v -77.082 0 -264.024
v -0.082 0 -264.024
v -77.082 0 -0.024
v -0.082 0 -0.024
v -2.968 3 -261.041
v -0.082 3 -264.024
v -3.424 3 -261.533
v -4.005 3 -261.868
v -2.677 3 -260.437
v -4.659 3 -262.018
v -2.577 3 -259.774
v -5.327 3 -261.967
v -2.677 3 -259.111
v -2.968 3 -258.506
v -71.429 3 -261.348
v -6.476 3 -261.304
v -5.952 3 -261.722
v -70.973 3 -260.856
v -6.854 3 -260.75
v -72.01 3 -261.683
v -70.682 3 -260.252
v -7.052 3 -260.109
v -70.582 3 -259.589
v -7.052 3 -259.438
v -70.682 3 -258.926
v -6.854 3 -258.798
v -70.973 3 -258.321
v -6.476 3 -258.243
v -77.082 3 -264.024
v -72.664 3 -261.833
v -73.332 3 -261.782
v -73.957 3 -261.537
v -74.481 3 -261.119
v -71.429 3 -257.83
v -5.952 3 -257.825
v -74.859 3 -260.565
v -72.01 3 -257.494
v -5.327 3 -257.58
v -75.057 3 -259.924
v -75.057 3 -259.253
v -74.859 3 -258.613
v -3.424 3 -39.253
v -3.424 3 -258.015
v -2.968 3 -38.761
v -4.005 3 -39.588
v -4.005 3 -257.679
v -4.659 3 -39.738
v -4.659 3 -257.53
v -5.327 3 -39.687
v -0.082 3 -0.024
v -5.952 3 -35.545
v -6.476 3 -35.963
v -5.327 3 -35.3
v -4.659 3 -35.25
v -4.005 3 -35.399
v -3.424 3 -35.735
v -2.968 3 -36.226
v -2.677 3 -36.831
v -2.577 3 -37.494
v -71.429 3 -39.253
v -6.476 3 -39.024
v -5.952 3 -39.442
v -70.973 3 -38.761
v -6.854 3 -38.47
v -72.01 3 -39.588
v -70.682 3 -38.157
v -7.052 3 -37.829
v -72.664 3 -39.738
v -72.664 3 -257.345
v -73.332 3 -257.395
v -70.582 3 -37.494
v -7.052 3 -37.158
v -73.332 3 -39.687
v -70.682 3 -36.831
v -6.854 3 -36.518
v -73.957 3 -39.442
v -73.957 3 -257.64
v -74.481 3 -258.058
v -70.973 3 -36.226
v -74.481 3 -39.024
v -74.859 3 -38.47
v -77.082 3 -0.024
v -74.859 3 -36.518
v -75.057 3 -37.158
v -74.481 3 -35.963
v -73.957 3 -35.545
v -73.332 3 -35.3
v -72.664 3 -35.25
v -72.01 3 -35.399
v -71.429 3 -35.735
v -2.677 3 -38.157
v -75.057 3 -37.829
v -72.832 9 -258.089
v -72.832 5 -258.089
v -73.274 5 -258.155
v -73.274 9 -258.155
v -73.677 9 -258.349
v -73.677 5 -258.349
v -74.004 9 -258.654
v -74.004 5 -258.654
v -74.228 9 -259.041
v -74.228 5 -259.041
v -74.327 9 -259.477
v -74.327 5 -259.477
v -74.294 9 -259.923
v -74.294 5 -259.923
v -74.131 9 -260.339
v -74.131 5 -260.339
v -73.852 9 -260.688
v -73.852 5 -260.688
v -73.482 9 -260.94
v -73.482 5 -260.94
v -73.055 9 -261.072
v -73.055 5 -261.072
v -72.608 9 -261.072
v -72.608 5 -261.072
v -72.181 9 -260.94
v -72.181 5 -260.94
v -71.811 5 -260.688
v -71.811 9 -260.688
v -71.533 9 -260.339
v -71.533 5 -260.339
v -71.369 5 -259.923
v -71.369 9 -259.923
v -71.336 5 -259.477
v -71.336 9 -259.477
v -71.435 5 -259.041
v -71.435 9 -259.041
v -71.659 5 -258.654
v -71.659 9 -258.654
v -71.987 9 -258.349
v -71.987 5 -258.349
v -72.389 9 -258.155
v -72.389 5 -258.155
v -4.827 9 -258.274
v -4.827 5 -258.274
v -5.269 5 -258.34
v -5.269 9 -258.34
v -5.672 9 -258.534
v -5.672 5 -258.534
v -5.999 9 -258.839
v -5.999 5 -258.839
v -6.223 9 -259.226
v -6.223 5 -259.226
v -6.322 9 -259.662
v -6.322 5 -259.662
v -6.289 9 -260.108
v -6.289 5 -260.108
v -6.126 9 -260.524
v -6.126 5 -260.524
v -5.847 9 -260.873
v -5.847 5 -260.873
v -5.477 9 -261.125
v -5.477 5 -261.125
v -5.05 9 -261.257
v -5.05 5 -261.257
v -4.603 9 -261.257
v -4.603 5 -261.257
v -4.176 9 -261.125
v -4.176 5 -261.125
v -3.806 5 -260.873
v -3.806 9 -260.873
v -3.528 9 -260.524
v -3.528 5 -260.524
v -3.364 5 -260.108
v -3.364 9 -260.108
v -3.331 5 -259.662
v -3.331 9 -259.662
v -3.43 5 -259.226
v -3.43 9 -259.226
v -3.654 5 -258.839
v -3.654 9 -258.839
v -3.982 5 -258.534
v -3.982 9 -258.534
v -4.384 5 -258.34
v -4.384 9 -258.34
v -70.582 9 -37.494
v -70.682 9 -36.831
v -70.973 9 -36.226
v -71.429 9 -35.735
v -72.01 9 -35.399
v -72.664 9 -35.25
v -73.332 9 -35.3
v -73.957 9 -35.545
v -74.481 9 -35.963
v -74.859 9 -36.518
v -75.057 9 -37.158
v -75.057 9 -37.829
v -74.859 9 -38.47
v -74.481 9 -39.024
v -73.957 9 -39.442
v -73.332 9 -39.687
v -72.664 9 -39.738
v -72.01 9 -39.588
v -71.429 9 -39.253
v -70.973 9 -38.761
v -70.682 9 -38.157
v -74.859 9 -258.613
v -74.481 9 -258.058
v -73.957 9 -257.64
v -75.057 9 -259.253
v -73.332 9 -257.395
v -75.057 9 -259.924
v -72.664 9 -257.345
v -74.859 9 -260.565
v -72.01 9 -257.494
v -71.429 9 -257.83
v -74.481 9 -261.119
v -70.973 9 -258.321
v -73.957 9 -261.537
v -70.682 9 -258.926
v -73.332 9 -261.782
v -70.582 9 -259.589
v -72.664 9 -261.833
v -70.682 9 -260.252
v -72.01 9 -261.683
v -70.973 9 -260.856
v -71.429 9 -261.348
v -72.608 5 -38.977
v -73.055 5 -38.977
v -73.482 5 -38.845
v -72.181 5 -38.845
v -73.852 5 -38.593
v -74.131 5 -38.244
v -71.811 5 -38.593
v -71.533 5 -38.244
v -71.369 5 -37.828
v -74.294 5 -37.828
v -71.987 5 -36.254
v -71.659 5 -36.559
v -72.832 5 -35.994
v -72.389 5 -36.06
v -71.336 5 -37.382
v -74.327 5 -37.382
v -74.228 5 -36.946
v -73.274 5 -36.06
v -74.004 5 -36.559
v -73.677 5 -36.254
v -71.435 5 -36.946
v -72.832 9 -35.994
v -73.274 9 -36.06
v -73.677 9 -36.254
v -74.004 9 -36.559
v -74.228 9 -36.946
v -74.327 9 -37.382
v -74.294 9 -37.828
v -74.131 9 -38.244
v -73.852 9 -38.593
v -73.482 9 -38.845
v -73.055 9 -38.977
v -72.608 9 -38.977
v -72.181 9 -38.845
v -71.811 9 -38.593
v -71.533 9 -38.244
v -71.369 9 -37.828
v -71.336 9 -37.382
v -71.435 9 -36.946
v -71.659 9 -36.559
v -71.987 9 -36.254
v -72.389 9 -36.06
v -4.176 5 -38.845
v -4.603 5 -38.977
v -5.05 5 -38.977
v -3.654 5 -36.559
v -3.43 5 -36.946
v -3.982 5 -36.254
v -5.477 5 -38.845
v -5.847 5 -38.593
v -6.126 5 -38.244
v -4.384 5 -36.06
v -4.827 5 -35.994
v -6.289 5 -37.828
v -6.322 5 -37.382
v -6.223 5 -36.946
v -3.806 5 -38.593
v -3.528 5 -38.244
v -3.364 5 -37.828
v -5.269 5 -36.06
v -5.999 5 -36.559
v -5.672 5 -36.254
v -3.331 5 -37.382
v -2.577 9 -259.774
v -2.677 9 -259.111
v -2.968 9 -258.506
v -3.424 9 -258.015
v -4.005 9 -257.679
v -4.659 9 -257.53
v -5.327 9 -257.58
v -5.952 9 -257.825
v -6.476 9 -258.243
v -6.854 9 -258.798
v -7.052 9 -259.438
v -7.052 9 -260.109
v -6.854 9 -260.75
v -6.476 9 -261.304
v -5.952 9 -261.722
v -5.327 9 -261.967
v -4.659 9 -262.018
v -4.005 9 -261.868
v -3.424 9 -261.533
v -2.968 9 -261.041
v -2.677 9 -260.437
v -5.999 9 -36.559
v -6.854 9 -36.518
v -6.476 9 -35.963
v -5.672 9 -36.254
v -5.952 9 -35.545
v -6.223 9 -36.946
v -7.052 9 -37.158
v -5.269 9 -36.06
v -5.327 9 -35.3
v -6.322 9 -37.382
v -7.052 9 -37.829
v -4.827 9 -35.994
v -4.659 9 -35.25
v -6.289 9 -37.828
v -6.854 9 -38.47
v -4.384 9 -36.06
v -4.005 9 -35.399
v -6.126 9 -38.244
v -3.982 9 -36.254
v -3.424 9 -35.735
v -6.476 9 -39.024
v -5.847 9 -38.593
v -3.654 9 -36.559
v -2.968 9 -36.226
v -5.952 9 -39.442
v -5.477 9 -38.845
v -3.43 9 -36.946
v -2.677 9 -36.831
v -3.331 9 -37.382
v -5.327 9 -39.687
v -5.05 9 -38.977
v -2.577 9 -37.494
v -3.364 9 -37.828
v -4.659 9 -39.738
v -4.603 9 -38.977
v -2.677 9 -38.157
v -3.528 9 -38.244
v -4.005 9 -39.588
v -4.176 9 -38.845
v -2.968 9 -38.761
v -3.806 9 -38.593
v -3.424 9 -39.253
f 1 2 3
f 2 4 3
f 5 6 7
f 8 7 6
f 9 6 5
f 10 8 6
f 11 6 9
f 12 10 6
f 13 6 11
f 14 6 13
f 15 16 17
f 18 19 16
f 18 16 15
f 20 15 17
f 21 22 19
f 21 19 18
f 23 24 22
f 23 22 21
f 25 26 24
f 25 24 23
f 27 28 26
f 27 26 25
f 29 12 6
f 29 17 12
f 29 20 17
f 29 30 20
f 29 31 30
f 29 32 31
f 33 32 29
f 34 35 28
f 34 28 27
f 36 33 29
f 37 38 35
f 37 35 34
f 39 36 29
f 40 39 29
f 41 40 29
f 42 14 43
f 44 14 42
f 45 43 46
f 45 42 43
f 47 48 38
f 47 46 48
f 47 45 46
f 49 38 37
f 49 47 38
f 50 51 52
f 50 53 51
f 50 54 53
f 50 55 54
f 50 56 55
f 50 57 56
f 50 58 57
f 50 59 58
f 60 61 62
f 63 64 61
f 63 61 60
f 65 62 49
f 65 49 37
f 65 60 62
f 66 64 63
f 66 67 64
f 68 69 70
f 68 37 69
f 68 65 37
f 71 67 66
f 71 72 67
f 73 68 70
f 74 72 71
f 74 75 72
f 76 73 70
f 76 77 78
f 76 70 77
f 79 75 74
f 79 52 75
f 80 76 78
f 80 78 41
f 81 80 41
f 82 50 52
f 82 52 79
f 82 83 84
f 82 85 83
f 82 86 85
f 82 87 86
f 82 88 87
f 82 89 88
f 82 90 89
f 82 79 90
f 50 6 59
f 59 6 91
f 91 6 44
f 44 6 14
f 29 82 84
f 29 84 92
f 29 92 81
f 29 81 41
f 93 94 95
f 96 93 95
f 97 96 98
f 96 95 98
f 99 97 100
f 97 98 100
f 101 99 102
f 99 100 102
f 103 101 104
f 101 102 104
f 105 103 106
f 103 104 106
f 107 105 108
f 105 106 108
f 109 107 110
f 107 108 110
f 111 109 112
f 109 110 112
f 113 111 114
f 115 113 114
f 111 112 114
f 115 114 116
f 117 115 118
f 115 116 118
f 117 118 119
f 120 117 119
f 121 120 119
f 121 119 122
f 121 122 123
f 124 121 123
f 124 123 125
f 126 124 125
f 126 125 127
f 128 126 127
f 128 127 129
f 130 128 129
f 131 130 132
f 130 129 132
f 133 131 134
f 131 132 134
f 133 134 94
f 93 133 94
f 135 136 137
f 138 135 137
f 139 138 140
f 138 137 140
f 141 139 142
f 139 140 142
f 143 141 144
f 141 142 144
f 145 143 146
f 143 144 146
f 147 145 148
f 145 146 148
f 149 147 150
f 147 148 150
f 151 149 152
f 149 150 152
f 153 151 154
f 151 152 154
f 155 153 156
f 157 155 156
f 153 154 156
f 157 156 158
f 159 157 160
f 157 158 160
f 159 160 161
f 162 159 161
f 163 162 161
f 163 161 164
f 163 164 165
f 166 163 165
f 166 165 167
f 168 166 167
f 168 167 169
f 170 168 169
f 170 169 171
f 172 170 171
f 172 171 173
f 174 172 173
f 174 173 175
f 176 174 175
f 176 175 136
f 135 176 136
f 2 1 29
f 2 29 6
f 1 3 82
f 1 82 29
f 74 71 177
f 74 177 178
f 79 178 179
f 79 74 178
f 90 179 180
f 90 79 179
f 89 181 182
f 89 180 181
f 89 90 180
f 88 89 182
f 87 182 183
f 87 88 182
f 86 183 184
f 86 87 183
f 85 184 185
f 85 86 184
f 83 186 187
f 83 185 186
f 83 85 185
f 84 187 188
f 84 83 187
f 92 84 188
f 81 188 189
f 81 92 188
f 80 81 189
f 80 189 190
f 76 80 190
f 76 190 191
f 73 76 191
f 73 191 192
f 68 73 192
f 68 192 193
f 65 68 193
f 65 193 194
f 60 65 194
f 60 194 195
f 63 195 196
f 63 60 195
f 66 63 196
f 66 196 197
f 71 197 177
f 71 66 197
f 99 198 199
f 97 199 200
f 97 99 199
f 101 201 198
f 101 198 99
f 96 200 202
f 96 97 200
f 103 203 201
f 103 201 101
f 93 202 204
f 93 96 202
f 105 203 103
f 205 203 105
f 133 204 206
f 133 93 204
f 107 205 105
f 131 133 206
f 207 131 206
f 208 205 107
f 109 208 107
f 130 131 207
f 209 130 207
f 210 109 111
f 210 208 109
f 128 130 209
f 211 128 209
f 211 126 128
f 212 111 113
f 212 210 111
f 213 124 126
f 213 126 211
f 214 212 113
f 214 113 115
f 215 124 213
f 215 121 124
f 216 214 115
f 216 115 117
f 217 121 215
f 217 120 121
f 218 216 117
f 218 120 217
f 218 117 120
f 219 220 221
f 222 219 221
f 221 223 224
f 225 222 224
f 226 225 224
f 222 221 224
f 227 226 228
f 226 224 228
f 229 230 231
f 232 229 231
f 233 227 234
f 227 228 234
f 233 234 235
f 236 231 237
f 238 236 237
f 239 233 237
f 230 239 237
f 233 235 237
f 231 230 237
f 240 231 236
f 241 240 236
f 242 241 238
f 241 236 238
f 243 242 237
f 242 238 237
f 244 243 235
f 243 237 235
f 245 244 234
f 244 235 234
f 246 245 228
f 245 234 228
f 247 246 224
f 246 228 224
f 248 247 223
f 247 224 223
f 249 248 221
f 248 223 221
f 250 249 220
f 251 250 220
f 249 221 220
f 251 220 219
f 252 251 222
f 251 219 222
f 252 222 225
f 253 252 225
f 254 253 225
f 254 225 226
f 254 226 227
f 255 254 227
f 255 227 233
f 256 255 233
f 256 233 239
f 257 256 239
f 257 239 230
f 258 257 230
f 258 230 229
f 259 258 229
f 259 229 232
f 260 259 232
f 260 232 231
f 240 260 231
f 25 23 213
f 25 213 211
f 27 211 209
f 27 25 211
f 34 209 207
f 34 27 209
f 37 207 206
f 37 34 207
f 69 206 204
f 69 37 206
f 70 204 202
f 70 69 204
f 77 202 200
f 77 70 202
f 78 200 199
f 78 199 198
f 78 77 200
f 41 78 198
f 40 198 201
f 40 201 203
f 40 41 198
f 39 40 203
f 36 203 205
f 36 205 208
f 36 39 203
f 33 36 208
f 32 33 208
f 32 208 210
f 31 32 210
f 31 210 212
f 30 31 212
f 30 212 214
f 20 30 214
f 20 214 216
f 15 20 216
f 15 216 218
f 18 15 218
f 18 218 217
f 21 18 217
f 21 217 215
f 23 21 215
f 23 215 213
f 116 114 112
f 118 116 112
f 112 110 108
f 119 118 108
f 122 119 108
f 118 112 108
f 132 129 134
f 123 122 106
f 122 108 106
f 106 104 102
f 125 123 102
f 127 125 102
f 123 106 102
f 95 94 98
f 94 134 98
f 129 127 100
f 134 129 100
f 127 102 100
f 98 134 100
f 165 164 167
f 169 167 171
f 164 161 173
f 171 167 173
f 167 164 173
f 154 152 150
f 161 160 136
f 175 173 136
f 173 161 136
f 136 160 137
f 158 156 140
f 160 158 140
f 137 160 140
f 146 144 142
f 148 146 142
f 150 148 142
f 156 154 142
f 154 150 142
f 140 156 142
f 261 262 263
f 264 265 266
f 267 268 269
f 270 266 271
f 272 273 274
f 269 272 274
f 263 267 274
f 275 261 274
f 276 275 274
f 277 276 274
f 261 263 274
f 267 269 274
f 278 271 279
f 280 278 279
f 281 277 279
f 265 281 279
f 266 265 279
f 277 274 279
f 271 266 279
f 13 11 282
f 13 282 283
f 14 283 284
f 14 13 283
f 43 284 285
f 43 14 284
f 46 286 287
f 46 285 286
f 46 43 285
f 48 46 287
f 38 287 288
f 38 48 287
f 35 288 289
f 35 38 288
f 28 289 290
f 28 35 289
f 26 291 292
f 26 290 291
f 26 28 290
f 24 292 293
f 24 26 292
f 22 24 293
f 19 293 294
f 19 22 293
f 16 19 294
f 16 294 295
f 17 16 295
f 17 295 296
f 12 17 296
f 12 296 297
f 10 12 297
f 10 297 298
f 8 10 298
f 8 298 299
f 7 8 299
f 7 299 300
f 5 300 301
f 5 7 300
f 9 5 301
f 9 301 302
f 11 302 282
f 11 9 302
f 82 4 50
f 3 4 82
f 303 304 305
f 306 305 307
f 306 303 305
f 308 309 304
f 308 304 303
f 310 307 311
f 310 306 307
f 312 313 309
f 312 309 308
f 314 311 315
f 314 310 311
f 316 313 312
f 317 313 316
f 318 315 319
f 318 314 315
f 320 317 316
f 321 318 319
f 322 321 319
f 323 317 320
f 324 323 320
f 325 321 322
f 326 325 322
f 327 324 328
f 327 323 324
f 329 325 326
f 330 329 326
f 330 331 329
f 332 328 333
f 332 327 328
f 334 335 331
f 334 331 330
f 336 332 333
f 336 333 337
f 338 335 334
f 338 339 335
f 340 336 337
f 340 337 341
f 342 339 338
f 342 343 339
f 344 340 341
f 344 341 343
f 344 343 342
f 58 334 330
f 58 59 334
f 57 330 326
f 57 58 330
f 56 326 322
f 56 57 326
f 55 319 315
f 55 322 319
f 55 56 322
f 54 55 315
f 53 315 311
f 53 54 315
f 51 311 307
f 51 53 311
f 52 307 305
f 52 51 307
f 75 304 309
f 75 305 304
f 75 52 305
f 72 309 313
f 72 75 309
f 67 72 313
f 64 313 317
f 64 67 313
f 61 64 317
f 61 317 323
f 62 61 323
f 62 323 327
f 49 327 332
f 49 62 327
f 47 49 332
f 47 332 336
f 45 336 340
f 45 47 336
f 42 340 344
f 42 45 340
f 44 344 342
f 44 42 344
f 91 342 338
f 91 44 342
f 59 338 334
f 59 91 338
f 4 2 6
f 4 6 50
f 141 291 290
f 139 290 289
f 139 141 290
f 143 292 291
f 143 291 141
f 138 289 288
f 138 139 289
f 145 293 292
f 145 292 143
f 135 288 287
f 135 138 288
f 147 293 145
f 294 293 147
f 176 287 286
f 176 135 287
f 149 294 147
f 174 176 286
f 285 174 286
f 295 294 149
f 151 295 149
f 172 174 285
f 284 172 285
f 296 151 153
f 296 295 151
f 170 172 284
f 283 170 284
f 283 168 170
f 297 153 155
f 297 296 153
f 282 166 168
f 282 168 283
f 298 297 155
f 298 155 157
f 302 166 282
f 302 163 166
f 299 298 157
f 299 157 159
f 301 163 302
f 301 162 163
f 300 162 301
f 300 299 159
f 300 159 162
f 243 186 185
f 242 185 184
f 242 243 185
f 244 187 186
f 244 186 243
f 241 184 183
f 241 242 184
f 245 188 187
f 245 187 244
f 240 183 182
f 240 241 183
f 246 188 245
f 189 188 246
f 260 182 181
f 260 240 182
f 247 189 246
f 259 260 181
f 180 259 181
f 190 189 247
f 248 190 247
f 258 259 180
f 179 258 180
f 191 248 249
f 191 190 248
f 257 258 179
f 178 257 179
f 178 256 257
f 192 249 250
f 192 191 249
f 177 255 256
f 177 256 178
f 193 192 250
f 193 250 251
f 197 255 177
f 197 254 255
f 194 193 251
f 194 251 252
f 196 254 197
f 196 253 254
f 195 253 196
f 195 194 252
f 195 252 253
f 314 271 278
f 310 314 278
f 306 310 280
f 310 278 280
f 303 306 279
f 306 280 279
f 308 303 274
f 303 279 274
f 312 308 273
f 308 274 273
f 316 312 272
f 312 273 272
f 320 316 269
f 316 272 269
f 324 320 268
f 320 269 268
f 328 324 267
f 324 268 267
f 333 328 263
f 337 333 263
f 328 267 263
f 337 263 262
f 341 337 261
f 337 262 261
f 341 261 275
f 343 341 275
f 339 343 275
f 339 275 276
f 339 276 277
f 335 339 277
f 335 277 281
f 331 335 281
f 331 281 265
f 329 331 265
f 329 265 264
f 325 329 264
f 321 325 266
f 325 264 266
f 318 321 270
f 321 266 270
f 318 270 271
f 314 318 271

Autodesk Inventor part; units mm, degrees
ref_plane "YZ Plane" through (0, 0, 0) normal (1, 0, 0) x (0, 1, 0)
ref_plane "XZ Plane" through (0, 0, 0) normal (0, 1, 0) x (-1, 0, 0)
ref_plane "XY Plane" through (0, 0, 0) normal (0, 0, 1) x (1, 0, 0)
sketch "Sketch1" plane through (0, 0, 0) normal (0, 1, 0) x (-1, 0, 0)
  point P0 (0, 0)
sketch "Sketch2" plane through (0, 0, 0) normal (0, 1, 0) x (-1, 0, 0)
  line L0 (0.0816, -0.0238) -> (77.0816, -0.0238)
  line L1 (77.0816, -0.0238) -> (77.0816, -264.0238)
  line L2 (77.0816, -264.0238) -> (0.0816, -264.0238)
  line L3 (0.0816, -264.0238) -> (0.0816, -0.0238)
  line L4 (2.0816, -2.0238) -> (75.0816, -2.0238)
  line L5 (75.0816, -2.0238) -> (75.0816, -262.0238)
  line L6 (75.0816, -262.0238) -> (2.0816, -262.0238)
  line L7 (2.0816, -262.0238) -> (2.0816, -2.0238)
  line L8 (2.0816, -2.0238) -> (2.0816, -4.4588)
  line L9 (75.0816, -2.0238) -> (75.0816, -4.4588)
  line L10 (2.0816, -262.0238) -> (2.0816, -226.5538)
  circle A0 centre (72.3366, -4.2738) radius 2.25
  circle A1 centre (4.3316, -4.4588) radius 2.25
  circle A2 centre (4.3316, -226.5538) radius 2.25
  circle A3 centre (72.3366, -226.5538) radius 2.25
  dimension "d24" = 4.5
  dimension "d25" = 4.5
  dimension "d3" = 77
  dimension "d4" = 264
  dimension "d7" = 73
  dimension "d8" = 260
  dimension "d23" = 4.5
  dimension "d26" = 4.5
extrude "Extrusion1" add sketch "Sketch2" along normal blind 3 contours L0 L1 L2 L3 | A1 | A2 | A0 | L4 L5 L6 L7 | A3
sketch "Sketch3" plane through (-77.1633, 3, -264.0476) normal (0, 1, 0) x (1, 0, 0)
  line L0 (2.0816, -2.0238) -> (2.0816, -4.4588)
  line L1 (75.0816, -2.0238) -> (75.0816, -4.4588)
  circle A0 centre (72.3366, -4.2738) radius 2.25
  circle A1 centre (4.3316, -4.4588) radius 2.25
  circle A2 centre (4.3316, -226.5538) radius 2.25
  circle A3 centre (72.3366, -226.5538) radius 2.25
  dimension "d29" = 4.5
  dimension "d30" = 4.5
  dimension "d28" = 4.5
  dimension "d27" = 4.5
extrude "Extrusion3" add sketch "Sketch3" along normal blind 6
hole "Hole1" at (-4.8266, 9, -259.7738) direction (0, -1, 0) diameter 3 depth 4
hole "Hole2" at (-4.8266, 9, -37.4938) direction (0, -1, 0) diameter 3 depth 4
hole "Hole3" at (-72.8316, 9, -37.4938) direction (0, -1, 0) diameter 3 depth 4
hole "Hole4" at (-72.8316, 9, -259.5888) direction (0, -1, 0) diameter 3 depth 4
